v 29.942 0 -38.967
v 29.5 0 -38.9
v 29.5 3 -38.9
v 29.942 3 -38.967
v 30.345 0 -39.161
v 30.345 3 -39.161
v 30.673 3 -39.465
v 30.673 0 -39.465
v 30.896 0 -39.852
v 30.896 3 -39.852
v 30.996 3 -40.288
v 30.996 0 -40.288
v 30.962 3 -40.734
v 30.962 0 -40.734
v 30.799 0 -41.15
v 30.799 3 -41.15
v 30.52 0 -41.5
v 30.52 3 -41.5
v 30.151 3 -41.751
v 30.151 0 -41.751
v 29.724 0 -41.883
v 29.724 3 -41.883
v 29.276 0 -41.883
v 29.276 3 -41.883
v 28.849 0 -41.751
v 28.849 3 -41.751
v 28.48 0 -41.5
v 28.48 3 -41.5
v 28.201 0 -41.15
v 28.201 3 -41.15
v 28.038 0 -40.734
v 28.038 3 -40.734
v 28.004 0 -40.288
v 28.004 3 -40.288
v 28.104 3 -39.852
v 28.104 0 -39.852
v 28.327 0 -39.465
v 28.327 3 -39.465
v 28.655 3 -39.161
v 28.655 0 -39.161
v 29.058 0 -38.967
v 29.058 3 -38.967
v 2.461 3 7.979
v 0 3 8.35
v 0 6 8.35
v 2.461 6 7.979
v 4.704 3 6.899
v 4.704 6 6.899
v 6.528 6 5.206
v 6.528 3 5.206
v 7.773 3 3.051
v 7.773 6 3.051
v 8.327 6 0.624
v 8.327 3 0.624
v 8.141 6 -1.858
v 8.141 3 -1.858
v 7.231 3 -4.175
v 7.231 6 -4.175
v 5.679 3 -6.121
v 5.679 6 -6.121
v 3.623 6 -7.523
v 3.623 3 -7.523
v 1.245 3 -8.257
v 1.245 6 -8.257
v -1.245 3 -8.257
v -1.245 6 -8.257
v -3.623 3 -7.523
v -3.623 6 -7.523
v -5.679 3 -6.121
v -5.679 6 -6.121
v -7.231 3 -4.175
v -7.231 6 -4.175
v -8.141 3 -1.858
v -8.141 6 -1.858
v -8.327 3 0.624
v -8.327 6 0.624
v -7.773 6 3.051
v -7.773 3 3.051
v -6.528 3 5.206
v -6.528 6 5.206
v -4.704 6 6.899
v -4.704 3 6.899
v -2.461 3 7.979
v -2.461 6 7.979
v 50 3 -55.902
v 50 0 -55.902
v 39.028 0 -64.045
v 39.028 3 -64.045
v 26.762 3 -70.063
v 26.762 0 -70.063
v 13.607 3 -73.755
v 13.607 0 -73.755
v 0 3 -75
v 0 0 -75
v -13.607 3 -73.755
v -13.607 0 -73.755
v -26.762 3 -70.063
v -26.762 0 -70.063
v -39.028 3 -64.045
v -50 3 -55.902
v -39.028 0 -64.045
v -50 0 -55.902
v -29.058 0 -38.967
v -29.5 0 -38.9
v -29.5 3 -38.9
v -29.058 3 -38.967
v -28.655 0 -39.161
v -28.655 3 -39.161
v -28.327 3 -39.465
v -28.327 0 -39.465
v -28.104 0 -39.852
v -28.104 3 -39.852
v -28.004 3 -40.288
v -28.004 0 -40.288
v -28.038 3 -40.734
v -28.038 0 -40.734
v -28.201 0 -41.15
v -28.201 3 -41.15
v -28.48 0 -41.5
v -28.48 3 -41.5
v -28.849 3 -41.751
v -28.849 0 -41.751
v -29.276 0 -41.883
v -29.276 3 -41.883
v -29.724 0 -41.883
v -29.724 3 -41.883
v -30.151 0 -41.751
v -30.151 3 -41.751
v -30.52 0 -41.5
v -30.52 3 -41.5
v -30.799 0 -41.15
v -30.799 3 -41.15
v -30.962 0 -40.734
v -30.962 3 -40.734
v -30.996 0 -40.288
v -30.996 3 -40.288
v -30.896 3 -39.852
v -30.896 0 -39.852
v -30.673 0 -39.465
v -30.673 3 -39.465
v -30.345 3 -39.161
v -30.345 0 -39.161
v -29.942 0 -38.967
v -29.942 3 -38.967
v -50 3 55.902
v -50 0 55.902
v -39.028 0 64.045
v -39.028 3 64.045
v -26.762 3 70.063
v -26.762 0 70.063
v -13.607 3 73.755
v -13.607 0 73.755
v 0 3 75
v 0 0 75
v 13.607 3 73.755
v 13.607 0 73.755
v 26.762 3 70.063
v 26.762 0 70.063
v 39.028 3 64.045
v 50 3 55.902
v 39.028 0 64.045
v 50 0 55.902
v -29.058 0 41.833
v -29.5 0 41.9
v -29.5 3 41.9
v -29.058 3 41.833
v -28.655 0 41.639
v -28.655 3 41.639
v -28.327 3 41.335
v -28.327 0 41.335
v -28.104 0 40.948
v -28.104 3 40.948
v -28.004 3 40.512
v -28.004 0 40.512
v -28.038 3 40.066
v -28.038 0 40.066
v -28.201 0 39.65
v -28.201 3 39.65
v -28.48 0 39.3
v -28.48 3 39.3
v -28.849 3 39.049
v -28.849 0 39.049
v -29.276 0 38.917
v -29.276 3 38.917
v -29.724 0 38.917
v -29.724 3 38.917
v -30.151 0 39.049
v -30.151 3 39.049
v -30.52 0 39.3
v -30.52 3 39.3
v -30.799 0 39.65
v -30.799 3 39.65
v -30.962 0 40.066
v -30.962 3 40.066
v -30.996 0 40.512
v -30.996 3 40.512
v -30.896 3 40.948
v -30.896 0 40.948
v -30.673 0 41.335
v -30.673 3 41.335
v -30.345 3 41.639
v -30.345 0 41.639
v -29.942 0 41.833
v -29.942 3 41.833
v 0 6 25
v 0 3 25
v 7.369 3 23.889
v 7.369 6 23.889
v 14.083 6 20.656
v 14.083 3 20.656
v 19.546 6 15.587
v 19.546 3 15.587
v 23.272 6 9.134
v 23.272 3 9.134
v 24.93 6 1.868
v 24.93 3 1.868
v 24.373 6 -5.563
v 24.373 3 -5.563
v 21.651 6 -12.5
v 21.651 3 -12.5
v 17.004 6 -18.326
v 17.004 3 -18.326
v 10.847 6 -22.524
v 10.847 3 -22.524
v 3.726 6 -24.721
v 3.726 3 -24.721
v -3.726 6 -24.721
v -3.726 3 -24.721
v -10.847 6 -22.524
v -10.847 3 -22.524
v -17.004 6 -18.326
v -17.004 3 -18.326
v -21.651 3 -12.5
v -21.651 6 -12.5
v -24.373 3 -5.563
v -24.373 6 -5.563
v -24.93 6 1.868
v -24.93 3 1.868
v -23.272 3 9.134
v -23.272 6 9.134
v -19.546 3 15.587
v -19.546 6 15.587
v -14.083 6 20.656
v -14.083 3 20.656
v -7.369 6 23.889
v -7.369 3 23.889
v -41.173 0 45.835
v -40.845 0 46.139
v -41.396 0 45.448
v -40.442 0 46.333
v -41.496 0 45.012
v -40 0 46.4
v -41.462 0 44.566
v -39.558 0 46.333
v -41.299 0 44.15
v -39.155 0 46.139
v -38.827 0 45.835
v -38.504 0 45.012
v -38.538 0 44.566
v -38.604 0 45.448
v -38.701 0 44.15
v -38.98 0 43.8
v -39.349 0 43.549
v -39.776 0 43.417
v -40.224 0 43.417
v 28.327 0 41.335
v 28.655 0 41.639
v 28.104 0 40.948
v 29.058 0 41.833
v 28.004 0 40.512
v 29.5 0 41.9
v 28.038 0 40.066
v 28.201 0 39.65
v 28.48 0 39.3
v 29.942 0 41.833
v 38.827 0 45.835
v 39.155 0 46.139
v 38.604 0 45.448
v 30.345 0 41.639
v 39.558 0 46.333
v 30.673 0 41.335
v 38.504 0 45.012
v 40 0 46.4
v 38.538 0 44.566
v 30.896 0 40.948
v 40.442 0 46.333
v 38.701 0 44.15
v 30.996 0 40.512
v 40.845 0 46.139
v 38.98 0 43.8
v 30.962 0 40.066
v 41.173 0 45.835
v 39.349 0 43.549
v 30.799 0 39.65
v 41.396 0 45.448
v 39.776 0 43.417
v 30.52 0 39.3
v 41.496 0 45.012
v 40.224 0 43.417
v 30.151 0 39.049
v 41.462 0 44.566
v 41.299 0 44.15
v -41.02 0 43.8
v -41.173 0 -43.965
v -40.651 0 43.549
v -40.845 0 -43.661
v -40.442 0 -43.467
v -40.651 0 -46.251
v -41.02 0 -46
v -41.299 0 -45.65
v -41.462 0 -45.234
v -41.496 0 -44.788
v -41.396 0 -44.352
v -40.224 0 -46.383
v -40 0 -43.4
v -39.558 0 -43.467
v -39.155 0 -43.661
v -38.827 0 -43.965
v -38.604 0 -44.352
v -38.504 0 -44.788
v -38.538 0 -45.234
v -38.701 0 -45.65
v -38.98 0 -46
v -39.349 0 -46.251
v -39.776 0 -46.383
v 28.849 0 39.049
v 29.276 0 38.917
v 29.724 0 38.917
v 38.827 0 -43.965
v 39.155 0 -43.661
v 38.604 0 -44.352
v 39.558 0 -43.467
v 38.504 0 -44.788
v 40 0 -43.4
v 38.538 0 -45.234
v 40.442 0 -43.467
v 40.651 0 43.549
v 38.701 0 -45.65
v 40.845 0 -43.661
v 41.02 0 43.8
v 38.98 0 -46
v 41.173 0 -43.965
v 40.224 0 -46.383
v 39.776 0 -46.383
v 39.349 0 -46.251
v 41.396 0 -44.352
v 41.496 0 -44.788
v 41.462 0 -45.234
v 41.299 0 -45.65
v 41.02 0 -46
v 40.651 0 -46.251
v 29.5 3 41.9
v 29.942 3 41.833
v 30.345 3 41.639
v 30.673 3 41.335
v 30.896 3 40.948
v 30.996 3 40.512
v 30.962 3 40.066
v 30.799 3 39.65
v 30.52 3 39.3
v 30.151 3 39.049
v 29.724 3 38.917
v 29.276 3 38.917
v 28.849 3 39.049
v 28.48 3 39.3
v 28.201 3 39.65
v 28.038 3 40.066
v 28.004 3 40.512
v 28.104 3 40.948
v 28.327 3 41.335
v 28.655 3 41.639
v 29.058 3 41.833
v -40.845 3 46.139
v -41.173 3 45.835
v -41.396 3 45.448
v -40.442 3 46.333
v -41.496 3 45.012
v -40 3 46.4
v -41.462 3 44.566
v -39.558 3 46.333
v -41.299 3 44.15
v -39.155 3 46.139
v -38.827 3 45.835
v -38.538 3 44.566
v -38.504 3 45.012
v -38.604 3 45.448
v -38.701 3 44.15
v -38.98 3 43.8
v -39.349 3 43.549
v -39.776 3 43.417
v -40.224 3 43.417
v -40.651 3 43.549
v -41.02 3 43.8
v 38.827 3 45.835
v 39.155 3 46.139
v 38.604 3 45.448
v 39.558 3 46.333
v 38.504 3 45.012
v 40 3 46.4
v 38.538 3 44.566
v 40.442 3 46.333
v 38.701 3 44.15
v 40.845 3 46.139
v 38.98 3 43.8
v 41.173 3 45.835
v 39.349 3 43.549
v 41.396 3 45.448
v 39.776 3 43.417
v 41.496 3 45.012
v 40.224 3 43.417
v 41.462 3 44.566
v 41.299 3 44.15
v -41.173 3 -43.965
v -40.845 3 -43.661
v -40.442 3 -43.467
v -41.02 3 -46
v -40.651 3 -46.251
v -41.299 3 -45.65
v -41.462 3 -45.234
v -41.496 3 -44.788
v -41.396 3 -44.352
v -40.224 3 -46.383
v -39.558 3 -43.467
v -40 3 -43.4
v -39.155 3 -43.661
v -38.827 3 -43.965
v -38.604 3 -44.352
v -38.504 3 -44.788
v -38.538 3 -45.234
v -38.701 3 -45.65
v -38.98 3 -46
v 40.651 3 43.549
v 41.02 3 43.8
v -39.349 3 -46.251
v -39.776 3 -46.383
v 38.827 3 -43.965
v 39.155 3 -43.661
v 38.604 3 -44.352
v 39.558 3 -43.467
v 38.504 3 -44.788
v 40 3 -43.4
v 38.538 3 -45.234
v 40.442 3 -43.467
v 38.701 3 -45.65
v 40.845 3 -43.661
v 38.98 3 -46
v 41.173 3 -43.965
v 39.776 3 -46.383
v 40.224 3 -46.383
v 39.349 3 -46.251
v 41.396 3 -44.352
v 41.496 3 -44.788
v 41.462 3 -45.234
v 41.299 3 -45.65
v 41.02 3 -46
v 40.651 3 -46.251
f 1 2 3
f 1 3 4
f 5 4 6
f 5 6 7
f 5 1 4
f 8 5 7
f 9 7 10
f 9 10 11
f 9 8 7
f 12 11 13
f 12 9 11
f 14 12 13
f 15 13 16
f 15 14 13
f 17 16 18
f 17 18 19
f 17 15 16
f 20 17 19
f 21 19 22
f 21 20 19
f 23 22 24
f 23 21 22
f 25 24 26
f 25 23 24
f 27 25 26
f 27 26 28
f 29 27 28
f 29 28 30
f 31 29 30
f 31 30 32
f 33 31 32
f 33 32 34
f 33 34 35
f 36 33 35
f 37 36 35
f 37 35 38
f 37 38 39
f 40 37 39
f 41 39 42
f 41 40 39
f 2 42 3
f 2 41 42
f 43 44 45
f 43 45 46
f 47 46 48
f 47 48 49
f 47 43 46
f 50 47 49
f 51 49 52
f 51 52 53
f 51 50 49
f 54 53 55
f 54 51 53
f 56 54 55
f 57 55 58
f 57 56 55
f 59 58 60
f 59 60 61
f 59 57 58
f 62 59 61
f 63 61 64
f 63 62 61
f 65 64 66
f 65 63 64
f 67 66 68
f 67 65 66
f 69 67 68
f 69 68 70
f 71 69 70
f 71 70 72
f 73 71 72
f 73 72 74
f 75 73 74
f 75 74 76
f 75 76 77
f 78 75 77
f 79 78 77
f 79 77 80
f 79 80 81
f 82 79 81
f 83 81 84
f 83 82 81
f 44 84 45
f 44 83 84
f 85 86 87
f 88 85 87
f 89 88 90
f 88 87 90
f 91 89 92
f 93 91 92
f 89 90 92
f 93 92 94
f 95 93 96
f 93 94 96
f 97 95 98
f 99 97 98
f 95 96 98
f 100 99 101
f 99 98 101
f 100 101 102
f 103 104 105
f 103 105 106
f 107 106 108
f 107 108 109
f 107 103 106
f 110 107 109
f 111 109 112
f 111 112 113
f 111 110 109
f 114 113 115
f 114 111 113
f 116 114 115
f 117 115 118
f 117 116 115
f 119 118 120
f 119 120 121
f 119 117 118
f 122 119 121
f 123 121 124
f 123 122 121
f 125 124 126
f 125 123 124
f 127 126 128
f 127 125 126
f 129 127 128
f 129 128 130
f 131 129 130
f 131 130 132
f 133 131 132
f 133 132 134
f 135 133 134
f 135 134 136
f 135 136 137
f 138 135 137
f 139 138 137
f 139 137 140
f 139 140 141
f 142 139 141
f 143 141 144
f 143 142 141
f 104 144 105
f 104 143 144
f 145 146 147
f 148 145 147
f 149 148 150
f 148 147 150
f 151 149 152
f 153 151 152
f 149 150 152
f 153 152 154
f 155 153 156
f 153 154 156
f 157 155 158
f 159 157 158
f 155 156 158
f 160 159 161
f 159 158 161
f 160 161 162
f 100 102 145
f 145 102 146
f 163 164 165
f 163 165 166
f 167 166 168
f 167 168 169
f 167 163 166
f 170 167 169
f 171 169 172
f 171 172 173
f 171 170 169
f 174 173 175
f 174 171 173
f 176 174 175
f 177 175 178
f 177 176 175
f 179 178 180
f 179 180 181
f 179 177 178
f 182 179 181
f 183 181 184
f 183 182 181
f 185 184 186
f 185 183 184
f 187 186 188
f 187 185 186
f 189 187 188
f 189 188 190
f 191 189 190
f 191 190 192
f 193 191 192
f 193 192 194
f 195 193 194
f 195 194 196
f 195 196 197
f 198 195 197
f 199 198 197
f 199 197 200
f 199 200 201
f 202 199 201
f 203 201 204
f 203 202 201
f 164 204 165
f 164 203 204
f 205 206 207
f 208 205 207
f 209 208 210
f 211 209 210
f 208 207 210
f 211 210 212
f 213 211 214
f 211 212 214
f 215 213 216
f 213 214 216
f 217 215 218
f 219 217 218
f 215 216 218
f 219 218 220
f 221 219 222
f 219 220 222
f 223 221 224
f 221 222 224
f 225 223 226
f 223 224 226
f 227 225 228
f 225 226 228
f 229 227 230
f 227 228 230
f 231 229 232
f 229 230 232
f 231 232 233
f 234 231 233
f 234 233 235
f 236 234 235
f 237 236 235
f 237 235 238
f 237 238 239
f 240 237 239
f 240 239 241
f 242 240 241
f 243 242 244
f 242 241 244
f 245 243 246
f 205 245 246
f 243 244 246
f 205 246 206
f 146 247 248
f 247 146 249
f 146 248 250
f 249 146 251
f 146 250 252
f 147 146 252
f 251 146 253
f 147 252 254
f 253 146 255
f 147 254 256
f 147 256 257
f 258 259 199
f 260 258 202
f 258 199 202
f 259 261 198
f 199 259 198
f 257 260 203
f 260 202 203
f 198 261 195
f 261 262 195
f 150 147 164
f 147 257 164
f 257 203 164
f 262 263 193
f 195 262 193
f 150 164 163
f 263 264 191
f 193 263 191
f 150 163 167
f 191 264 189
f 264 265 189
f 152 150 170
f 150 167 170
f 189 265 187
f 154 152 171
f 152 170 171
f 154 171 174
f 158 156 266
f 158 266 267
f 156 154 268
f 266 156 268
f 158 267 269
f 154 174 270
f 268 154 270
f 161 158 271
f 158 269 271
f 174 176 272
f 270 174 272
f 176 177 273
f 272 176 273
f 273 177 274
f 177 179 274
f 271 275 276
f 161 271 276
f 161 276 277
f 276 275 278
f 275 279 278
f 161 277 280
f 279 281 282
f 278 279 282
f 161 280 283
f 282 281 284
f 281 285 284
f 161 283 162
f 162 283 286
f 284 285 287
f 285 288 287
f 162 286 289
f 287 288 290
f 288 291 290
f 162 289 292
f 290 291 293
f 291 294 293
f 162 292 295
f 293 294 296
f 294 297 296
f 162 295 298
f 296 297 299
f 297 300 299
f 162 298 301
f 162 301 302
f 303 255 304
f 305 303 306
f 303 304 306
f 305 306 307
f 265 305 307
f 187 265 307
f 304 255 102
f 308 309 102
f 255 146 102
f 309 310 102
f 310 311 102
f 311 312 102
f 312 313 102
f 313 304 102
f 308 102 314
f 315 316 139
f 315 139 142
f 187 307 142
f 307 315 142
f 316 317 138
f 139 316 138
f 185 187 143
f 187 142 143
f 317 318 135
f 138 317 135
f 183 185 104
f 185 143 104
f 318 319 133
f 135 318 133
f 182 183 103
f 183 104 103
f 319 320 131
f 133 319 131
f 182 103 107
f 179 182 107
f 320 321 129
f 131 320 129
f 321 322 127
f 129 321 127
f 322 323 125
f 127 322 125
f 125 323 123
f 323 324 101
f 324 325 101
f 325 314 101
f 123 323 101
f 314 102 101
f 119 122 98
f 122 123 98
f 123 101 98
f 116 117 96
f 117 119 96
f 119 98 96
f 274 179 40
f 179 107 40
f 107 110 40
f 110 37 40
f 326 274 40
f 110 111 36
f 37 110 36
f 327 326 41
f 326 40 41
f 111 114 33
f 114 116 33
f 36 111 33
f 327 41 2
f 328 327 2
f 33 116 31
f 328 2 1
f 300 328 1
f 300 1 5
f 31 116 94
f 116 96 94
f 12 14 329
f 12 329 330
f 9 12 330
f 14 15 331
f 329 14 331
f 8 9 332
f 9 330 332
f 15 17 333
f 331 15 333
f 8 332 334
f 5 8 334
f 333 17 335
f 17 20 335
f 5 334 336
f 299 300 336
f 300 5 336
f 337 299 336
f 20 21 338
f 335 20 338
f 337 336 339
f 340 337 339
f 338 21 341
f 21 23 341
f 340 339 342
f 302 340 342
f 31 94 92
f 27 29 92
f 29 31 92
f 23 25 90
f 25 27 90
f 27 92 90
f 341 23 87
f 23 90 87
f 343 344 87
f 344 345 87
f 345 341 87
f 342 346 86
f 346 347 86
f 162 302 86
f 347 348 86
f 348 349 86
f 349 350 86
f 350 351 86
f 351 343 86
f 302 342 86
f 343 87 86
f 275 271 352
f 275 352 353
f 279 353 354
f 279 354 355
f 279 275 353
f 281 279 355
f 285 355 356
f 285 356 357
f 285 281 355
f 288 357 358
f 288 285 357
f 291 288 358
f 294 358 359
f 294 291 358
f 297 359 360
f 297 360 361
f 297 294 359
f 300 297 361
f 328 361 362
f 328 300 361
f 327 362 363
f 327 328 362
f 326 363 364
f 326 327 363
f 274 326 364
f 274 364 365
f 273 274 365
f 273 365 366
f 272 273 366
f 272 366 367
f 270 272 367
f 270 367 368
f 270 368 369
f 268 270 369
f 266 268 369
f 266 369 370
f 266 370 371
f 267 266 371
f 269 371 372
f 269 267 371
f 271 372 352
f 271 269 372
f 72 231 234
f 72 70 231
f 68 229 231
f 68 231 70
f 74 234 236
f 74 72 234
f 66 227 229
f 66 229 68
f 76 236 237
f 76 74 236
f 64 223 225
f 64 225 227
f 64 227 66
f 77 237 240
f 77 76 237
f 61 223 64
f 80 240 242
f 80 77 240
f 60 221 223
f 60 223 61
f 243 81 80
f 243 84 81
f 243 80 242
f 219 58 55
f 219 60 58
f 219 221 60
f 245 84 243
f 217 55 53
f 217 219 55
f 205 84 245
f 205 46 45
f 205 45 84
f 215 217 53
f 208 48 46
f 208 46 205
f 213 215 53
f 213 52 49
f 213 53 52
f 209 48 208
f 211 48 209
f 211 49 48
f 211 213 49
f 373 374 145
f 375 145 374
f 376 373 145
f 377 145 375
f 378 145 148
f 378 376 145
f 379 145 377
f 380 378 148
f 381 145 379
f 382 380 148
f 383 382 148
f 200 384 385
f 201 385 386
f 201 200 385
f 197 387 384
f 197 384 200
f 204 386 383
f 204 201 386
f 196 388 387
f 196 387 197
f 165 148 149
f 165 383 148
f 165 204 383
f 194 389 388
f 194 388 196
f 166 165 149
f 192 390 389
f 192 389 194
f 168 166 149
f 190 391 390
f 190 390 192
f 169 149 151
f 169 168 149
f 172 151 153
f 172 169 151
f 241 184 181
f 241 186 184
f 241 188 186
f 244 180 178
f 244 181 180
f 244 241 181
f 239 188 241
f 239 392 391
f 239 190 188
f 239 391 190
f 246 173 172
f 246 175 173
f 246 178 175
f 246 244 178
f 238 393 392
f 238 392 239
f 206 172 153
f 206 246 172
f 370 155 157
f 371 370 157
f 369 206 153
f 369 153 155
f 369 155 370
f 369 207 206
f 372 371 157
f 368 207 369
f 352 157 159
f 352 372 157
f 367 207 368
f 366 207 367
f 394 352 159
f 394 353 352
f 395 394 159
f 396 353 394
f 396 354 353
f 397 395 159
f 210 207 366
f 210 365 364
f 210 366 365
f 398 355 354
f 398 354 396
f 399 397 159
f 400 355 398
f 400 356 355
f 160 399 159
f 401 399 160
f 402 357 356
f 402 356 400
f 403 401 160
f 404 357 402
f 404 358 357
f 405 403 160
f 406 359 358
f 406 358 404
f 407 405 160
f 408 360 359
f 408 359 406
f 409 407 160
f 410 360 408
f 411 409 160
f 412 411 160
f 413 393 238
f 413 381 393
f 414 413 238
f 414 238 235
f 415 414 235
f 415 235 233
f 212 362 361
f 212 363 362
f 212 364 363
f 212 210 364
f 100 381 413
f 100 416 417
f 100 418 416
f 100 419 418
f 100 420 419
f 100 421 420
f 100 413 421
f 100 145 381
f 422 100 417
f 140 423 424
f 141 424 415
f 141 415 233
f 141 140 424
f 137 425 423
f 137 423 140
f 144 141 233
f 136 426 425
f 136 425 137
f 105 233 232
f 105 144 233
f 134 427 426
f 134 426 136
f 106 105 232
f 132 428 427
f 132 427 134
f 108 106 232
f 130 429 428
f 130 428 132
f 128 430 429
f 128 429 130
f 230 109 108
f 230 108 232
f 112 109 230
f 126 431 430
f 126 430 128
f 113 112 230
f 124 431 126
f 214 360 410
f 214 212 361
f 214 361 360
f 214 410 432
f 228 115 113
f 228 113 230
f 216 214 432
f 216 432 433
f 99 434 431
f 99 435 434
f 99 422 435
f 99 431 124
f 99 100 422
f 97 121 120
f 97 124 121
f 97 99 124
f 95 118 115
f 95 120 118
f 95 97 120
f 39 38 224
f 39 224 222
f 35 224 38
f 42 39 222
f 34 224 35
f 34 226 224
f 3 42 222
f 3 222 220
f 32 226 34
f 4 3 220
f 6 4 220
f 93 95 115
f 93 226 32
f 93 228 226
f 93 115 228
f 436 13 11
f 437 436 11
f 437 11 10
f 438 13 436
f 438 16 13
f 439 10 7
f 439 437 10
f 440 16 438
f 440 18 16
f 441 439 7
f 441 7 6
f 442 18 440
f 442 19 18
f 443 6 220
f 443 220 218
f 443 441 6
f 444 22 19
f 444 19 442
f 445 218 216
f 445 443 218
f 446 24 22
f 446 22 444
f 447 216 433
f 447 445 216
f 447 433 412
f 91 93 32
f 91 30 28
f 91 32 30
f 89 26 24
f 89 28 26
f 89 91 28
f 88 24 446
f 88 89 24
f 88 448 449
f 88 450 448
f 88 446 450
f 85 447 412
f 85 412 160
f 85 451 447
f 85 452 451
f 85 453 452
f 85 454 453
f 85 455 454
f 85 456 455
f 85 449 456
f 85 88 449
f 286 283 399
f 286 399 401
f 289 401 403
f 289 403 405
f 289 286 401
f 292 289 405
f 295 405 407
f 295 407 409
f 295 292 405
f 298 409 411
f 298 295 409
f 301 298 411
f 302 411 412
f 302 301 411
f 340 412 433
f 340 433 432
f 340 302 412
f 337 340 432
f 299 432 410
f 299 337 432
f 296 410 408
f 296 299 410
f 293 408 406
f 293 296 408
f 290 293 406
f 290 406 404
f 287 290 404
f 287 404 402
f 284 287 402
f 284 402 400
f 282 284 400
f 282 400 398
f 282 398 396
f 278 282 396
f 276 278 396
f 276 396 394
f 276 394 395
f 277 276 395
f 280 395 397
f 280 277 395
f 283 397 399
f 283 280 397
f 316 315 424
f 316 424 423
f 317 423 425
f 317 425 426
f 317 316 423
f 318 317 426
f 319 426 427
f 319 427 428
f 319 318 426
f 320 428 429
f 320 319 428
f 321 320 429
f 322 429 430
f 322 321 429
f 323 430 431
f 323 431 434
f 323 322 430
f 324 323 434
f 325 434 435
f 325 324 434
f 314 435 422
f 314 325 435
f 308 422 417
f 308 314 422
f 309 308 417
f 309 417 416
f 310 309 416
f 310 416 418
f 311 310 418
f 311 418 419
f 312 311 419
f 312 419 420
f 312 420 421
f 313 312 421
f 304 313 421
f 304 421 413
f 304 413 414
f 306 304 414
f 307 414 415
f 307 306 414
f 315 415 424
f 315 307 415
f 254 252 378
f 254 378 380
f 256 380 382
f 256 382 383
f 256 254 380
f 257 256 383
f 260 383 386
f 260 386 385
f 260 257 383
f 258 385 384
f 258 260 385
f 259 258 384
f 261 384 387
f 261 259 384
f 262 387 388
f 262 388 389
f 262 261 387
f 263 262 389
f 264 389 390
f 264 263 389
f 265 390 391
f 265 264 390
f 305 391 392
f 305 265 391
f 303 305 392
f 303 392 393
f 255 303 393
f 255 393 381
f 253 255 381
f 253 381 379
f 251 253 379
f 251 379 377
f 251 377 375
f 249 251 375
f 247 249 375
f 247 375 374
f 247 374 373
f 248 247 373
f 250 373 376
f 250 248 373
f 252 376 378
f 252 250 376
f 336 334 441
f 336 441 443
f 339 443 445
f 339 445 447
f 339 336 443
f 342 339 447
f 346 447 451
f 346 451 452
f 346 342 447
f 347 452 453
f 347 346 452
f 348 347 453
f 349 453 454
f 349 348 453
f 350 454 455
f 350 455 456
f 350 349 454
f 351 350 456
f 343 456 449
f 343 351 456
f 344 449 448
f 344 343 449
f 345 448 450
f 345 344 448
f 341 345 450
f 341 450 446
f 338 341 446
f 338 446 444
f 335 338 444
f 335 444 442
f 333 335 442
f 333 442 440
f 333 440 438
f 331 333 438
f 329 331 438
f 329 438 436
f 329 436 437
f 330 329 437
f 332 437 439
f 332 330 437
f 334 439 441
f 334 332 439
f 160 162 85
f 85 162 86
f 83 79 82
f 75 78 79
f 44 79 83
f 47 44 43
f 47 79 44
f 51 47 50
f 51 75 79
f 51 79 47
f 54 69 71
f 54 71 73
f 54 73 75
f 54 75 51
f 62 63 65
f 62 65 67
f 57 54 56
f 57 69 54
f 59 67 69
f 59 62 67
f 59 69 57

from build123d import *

# Parameters (mm, degrees)
SKETCH1_R           = 1.5
BOSS_EXTRUDE1_DEPTH = 3
SKETCH2_R           = 25
SKETCH2_R_2         = 8.35
BOSS_EXTRUDE2_DEPTH = 3


with BuildPart() as part:
    # Sketch1 → Boss-Extrude1 (new body)
    with BuildSketch(Plane(origin=(0, 0, 0), x_dir=(1, 0, 0), z_dir=(0, 1, 0))):
        with BuildLine():
            Line((50, 0), (50, 55.901699437))
            ThreePointArc((50, 55.901699437), (0, 75), (-50, 55.901699437))
            Line((-50, 55.901699437), (-50, 0))
            Line((-50, 0), (-50, -55.901699437))
            ThreePointArc((-50, -55.901699437), (0, -75), (50, -55.901699437))
            Line((50, -55.901699437), (50, 0))
        make_face()
        with Locations(Location((-40, -44.9, 0), (0, 0, 270))):
            Circle(SKETCH1_R, mode=Mode.SUBTRACT)
        with Locations(Location((-29.5, -40.4, 0), (0, 0, 270))):
            Circle(SKETCH1_R, mode=Mode.SUBTRACT)
        with Locations(Location((29.5, -40.4, 0), (0, 0, 270))):
            Circle(SKETCH1_R, mode=Mode.SUBTRACT)
        with Locations(Location((-29.5, 40.4, 0), (0, 0, 270))):
            Circle(SKETCH1_R, mode=Mode.SUBTRACT)
        with Locations(Location((29.5, 40.4, 0), (0, 0, 270))):
            Circle(SKETCH1_R, mode=Mode.SUBTRACT)
        with Locations(Location((40, 44.9, 0), (0, 0, 270))):
            Circle(SKETCH1_R, mode=Mode.SUBTRACT)
        with Locations(Location((-40, 44.9, 0), (0, 0, 270))):
            Circle(SKETCH1_R, mode=Mode.SUBTRACT)
        with Locations(Location((40, -44.9, 0), (0, 0, 270))):
            Circle(SKETCH1_R, mode=Mode.SUBTRACT)
    extrude(amount=BOSS_EXTRUDE1_DEPTH)

    # Sketch2 → Boss-Extrude2 (add)
    with BuildSketch(Plane(origin=(0, 3, 0), x_dir=(1, 0, 0), z_dir=(0, 1, 0))):
        with Locations(Location((0, 0, 0), (0, 0, 270))):
            Circle(SKETCH2_R)
        with Locations(Location((0, 0, 0), (0, 0, 270))):
            Circle(SKETCH2_R_2, mode=Mode.SUBTRACT)
    extrude(amount=BOSS_EXTRUDE2_DEPTH)


solid = part.part
